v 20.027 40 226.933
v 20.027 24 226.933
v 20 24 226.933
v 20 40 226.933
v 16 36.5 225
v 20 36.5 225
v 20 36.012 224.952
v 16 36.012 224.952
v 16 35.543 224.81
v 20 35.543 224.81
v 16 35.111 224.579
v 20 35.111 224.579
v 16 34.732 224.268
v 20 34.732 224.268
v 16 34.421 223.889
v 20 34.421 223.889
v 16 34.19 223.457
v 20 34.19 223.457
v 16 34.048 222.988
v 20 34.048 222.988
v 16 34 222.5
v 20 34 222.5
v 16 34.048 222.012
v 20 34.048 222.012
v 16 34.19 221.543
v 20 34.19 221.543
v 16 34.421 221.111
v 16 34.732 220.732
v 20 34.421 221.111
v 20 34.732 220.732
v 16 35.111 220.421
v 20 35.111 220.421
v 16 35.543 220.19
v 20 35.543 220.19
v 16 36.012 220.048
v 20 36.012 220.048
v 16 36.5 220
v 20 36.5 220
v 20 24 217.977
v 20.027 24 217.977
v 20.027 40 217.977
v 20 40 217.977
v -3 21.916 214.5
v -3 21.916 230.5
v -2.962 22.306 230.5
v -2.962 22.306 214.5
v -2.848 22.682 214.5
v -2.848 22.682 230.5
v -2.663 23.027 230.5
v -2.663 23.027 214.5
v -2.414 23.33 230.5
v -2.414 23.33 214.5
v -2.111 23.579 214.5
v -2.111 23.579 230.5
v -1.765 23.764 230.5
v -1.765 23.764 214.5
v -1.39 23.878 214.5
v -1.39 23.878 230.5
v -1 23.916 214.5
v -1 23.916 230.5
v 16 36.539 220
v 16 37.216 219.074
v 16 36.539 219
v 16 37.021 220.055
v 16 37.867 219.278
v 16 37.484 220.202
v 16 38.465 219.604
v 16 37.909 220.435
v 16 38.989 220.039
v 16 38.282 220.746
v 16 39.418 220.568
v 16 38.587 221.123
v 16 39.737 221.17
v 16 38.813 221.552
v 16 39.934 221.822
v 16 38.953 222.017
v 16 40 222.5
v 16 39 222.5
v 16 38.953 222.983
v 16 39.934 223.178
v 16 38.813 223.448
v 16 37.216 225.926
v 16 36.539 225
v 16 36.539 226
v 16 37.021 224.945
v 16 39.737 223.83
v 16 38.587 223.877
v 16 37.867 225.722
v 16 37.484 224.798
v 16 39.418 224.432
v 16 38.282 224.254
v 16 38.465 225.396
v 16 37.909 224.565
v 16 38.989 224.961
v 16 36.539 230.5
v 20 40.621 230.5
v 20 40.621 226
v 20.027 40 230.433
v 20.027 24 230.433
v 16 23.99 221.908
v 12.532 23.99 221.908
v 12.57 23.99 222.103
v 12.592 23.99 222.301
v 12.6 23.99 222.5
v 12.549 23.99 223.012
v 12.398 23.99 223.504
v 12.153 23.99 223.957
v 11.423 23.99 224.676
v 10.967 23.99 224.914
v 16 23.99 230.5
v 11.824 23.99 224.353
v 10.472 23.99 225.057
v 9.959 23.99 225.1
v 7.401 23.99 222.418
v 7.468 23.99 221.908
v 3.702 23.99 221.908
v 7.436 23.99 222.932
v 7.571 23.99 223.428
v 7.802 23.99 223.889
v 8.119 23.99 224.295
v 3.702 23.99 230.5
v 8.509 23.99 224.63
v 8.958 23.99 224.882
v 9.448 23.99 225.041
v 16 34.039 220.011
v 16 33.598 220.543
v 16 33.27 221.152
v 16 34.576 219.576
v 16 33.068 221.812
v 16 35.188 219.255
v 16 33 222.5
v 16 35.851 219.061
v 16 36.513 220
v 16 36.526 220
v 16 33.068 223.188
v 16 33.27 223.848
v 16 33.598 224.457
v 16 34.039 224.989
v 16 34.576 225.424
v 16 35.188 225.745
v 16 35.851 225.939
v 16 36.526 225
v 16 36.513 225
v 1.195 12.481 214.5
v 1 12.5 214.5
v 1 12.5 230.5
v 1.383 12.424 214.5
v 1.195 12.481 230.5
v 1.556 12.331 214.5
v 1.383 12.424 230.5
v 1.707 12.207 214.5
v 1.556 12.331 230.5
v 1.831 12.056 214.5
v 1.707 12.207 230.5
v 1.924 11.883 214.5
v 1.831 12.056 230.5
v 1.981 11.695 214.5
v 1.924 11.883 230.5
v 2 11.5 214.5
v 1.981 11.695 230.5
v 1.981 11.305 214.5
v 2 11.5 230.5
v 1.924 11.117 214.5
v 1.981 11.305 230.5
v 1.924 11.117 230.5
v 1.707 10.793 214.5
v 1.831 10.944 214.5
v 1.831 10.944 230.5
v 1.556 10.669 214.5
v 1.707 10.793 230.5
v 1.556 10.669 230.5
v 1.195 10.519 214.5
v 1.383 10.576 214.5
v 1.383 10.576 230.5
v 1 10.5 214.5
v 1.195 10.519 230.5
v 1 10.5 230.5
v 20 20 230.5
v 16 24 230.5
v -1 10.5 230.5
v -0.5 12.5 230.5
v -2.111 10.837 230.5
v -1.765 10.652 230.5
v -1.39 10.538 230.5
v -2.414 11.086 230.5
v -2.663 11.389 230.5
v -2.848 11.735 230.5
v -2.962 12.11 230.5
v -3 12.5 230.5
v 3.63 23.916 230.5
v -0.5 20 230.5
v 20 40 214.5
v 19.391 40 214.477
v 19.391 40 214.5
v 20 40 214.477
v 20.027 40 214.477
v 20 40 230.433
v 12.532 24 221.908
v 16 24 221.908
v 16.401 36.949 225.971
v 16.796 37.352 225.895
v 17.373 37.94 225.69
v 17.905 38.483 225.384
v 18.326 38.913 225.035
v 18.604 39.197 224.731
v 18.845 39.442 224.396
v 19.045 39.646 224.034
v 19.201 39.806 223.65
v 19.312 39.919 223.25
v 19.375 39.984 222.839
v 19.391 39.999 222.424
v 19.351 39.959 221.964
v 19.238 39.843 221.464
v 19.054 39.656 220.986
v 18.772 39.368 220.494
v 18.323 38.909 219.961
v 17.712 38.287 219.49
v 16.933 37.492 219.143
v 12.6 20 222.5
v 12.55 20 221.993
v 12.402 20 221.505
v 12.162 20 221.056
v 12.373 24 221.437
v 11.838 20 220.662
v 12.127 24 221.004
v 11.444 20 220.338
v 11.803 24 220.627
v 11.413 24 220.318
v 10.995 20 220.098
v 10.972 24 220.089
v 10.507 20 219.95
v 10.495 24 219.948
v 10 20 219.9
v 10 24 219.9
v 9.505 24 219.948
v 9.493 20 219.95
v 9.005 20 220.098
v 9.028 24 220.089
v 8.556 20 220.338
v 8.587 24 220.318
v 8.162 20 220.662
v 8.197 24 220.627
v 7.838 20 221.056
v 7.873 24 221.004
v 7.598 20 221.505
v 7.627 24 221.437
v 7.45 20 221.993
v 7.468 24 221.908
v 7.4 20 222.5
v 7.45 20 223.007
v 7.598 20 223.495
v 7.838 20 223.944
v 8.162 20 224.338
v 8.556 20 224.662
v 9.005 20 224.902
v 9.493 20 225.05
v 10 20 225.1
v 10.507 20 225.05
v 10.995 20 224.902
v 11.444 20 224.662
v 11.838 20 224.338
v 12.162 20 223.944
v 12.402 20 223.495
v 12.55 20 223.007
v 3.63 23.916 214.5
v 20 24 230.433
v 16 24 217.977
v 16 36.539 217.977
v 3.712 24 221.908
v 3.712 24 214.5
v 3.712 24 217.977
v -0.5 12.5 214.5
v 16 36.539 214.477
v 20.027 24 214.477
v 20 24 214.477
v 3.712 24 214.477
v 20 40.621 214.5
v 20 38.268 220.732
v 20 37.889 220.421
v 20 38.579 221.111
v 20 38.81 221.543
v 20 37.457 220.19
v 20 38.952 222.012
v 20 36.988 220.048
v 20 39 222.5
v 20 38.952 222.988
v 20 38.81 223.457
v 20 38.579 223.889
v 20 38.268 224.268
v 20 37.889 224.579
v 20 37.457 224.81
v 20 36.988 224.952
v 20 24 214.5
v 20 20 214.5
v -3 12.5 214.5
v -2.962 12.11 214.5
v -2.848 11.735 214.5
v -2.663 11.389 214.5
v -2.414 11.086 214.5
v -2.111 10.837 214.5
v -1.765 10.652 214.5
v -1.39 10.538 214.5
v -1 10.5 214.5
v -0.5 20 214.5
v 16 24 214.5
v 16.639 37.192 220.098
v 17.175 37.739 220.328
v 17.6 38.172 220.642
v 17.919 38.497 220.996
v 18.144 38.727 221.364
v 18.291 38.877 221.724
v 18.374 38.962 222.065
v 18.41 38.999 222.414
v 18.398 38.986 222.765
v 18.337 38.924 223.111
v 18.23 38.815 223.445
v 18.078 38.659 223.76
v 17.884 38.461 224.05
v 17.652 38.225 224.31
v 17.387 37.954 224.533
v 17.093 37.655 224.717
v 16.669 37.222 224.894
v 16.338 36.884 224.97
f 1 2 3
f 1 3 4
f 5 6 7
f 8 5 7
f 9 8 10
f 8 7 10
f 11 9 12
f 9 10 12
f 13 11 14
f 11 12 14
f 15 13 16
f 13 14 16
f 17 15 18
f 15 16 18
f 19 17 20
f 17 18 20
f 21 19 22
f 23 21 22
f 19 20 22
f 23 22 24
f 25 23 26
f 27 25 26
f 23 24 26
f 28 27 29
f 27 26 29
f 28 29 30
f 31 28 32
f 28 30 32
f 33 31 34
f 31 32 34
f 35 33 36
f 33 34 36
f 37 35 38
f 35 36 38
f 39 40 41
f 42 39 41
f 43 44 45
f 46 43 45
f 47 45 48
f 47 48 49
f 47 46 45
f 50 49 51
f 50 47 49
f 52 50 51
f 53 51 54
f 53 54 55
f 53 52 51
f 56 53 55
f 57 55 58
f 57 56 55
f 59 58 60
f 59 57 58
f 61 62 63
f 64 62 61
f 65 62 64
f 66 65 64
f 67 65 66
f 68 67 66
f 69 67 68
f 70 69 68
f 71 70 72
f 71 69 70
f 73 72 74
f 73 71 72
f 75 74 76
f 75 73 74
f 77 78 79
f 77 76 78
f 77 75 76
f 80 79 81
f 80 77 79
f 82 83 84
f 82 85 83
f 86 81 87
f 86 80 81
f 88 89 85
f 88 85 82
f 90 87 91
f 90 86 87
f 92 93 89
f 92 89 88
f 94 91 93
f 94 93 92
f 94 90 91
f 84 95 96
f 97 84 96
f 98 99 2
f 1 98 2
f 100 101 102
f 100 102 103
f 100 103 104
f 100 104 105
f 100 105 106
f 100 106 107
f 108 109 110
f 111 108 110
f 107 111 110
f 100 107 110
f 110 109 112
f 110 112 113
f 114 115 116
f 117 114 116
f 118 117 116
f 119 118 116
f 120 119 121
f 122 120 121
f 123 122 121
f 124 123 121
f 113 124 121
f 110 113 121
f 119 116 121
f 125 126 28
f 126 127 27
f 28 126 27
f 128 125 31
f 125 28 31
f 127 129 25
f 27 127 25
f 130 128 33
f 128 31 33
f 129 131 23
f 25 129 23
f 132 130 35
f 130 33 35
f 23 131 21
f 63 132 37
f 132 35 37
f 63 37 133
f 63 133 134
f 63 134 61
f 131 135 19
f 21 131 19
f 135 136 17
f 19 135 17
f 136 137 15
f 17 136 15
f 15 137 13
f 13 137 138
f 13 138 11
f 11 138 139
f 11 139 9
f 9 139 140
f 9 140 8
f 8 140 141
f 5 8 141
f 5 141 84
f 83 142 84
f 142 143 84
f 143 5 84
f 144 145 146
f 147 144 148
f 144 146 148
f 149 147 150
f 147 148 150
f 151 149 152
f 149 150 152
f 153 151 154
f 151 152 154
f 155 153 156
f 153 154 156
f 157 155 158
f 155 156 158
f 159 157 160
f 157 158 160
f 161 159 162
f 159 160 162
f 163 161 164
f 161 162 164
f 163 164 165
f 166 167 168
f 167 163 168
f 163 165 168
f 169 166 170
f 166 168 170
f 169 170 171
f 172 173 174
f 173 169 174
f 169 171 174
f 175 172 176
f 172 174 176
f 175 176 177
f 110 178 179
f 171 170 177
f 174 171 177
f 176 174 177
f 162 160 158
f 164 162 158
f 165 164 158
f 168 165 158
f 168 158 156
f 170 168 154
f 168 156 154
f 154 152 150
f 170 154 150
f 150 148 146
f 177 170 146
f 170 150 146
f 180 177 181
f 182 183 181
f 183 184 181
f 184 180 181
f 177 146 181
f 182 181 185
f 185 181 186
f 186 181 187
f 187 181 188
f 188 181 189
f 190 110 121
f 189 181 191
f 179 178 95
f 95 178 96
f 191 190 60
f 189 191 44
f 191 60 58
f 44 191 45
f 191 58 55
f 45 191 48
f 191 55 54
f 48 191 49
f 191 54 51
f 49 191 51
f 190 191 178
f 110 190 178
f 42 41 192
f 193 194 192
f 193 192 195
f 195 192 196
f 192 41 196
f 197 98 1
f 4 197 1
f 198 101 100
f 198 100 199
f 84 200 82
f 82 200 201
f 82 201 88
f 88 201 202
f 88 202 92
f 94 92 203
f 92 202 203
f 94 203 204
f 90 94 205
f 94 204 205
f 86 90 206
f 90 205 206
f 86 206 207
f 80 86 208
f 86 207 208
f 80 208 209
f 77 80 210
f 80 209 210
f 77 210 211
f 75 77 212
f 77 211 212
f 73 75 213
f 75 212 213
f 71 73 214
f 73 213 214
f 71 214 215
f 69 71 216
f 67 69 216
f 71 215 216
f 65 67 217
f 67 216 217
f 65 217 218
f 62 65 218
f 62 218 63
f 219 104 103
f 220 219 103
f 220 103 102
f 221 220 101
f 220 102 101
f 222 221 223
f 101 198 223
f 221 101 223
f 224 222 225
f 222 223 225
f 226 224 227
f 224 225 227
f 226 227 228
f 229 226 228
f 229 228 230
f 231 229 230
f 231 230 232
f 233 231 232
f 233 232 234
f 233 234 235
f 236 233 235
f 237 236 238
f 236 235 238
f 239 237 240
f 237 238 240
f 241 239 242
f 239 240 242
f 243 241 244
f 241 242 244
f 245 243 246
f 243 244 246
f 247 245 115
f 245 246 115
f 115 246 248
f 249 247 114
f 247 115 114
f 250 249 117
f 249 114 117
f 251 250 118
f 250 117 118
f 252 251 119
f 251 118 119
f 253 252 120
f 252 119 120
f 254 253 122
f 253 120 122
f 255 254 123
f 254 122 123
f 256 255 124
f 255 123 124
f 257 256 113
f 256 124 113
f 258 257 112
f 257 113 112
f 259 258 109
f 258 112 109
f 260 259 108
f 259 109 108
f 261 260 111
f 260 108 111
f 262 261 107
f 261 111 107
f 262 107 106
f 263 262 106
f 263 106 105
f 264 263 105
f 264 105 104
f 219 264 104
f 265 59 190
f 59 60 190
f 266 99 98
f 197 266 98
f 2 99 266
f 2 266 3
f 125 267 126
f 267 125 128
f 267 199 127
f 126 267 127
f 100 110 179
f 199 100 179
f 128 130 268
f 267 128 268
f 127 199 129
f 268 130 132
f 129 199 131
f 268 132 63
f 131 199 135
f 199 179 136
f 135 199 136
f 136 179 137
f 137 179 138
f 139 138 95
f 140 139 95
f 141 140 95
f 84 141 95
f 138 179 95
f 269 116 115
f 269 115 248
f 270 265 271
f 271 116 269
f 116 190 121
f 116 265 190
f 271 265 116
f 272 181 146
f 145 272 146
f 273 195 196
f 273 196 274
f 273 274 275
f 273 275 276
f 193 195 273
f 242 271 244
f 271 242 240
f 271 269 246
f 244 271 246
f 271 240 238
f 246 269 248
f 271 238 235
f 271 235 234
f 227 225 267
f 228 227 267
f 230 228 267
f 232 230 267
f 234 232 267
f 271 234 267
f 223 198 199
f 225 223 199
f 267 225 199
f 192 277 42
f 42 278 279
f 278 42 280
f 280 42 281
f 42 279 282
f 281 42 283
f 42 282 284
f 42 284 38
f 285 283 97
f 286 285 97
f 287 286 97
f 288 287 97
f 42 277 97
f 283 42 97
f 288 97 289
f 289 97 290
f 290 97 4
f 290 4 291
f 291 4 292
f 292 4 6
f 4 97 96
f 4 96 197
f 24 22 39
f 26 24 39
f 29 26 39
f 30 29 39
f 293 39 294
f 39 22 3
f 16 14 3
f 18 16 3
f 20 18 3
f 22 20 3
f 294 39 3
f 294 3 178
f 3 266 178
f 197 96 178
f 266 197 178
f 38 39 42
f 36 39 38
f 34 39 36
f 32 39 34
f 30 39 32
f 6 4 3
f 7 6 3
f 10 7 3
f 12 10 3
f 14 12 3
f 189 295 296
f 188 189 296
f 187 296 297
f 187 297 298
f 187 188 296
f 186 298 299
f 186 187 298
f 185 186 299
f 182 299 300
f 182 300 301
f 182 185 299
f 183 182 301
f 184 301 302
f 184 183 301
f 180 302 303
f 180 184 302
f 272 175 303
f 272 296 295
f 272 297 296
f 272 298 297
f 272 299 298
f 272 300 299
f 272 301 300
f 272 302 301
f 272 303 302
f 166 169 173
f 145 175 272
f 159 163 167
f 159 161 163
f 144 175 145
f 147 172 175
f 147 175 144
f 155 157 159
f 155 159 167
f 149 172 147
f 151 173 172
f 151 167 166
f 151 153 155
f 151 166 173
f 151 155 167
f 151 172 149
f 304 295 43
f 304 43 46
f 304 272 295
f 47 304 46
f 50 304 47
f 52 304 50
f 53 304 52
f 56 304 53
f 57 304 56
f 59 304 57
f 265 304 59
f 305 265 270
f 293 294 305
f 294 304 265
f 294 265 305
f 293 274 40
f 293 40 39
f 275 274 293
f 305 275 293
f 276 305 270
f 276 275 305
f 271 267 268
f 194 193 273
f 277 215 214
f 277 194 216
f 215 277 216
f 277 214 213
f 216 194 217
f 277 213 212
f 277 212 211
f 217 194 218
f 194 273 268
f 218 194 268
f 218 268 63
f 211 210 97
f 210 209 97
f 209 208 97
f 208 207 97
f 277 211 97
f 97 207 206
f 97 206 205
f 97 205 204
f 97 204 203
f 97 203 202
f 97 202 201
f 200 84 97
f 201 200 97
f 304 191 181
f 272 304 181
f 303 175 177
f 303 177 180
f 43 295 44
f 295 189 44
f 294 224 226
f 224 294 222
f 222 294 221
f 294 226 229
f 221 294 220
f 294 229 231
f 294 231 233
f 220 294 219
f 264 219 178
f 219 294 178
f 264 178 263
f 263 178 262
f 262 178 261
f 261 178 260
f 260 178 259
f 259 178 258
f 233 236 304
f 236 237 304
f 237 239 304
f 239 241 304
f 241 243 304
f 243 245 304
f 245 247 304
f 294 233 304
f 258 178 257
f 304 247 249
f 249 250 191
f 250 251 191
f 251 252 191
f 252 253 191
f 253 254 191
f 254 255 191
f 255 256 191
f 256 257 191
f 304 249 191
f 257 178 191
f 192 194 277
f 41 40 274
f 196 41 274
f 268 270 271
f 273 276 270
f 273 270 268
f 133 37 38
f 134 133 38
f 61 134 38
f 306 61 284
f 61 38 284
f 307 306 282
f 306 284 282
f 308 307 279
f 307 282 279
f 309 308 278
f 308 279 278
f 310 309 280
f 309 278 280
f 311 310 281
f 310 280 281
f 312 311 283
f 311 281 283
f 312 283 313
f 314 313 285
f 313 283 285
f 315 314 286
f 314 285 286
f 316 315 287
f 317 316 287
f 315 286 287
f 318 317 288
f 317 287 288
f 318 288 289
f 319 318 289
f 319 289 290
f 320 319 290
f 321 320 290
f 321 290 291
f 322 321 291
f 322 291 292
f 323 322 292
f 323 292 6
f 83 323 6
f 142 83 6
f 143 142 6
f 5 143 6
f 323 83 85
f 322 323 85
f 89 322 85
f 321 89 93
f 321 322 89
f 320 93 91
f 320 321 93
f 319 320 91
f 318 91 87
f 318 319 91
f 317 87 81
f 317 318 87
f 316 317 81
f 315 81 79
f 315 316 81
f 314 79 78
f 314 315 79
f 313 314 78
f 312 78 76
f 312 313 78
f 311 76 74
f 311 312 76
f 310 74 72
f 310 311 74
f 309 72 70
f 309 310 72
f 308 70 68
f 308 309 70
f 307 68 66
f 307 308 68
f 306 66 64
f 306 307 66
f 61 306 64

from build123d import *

# Parameters (mm, degrees)
SKETCH1_W                      = 30.121125575
SKETCH1_H                      = 11.523232915
BOSS_EXTRUDE1_DEPTH            = 4
SKETCH2_W                      = 0.023452759
SKETCH2_H                      = 13.5
CUT_EXTRUDE1_DEPTH             = 4
SKETCH3_W                      = 11.499780156
SKETCH3_H                      = 13.5
BOSS_EXTRUDE2_DEPTH            = 19
CUT_EXTRUDE2_DEPTH             = 47.721095233
DRAFT1_ANGLE                   = -45.58058215
SKETCH5_W                      = 11.499780156
SKETCH5_H                      = 0.083772182
CUT_EXTRUDE3_DEPTH             = 6.630261323
SKETCH6_W                      = 20.5
SKETCH6_H                      = 11.499780156
CUT_EXTRUDE4_DEPTH             = 7.5
BOSS_EXTRUDE3_START            = 4.500219844
BOSS_EXTRUDE3_DEPTH            = 4.500219844
SKETCH8_W                      = 8.592269897
SKETCH8_H                      = 0.01006031
CUT_EXTRUDE5_DEPTH             = 12.369738677
DRAFT2_ANGLE                   = 44.41941785
FILLET1_R                      = 2
CUT_EXTRUDE6_REACH             = 50.022
SKETCH10_W                     = 3.5
SKETCH10_H                     = 16
BOSS_EXTRUDE4_DEPTH            = 0.02681
SKETCH11_W                     = 3.5
SKETCH11_H                     = 16
BOSS_EXTRUDE5_DEPTH            = 0.02681
BOSS_EXTRUDE6_DEPTH            = 3.5
F_5_2_5_2_DIAMETER_HOLE1_D     = 5.2
F_5_2_5_2_DIAMETER_HOLE1_DEPTH = 20.621150575
F_5_0_5_DIAMETER_HOLE1_D       = 5
F_5_0_5_DIAMETER_HOLE1_DEPTH   = 4.026810169
BOSS_EXTRUDE7_START            = -4
SKETCH17_R                     = 3.5
SKETCH17_R_2                   = 2.5
BOSS_EXTRUDE7_DEPTH            = 4


with BuildPart() as part:
    # Sketch1 → Boss-Extrude1 (new body)
    with BuildSketch(Plane(origin=(16, 0, 0), x_dir=(0, -1, 0), z_dir=(-1, 0, 0))):
        with Locations((-25.560562788, 220.238163699)):
            Rectangle(SKETCH1_W, SKETCH1_H)
    extrude(amount=-BOSS_EXTRUDE1_DEPTH)

    # Sketch2 → Cut-Extrude1 (cut)
    with BuildSketch(Plane(origin=(20, 0, 0), x_dir=(0, 0, -1), z_dir=(1, 0, 0))):
        with Locations((-214.488273621, 17.25)):
            Rectangle(SKETCH2_W, SKETCH2_H)
    extrude(amount=-CUT_EXTRUDE1_DEPTH, mode=Mode.SUBTRACT)

    # Sketch3 → Boss-Extrude2 (add)
    with BuildSketch(Plane.ZY.offset(-16)):
        with Locations((220.249890078, 17.25)):
            Rectangle(SKETCH3_W, SKETCH3_H)
    extrude(amount=BOSS_EXTRUDE2_DEPTH)

    # Sketch4 → Cut-Extrude2 (cut, through all)
    with BuildSketch(Plane.XY.offset(225.999780156)):
        with BuildLine():
            Line((1, 10.5), (20, 10.5))
            Line((20, 10.5), (20, 12.5))
            Line((20, 12.5), (1, 12.5))
            ThreePointArc((1, 12.5), (2, 11.5), (1, 10.5))
        make_face()
    extrude(amount=-CUT_EXTRUDE2_DEPTH, mode=Mode.SUBTRACT)

    # Draft1
    draft1_faces = [part.faces().sort_by_distance(p)[0] for p in [
        (18, 40.621125575, 220.238163698),
    ]]
    draft(draft1_faces, Plane(origin=(20, 0, 0), x_dir=(0, 0, 1), z_dir=(1, 0, 0)), DRAFT1_ANGLE)

    # Sketch5 → Cut-Extrude3 (cut)
    with BuildSketch(Plane.ZY.offset(3)):
        with Locations((220.249890078, 23.958113909)):
            Rectangle(SKETCH5_W, SKETCH5_H)
    extrude(amount=-CUT_EXTRUDE3_DEPTH, mode=Mode.SUBTRACT)

    # Sketch6 → Cut-Extrude4 (cut)
    with BuildSketch(Plane.XZ.offset(-12.5)):
        with Locations((9.75, 220.249890078)):
            Rectangle(SKETCH6_W, SKETCH6_H)
    extrude(amount=-CUT_EXTRUDE4_DEPTH, mode=Mode.SUBTRACT)

    # Sketch7 → Boss-Extrude3 (add)
    with BuildSketch(Plane.XY.offset(225.999780156).offset(BOSS_EXTRUDE3_START)):
        with BuildLine():
            Line((-3, 10.5), (-3, 23.916227818))
            Line((-3, 23.916227818), (3.630261323, 23.916227818))
            Line((3.630261323, 23.916227818), (3.630261323, 24))
            Line((3.630261323, 24), (16, 24))
            Line((16, 24), (16, 36.539228341))
            Line((16, 36.539228341), (20, 40.621125575))
            Line((20, 40.621125575), (20, 20))
            Line((20, 20), (-0.5, 20))
            Line((-0.5, 20), (-0.5, 12.5))
            Line((-0.5, 12.5), (1, 12.5))
            ThreePointArc((1, 12.5), (2, 11.5), (1, 10.5))
            Line((1, 10.5), (-3, 10.5))
        make_face()
    extrude(amount=-BOSS_EXTRUDE3_DEPTH)

    # Sketch8 → Cut-Extrude5 (cut)
    with BuildSketch(Plane.ZY.offset(-3.630261323)):
        with Locations((226.203865052, 23.994969845)):
            Rectangle(SKETCH8_W, SKETCH8_H)
    extrude(amount=-CUT_EXTRUDE5_DEPTH, mode=Mode.SUBTRACT)

    # Draft2
    draft2_faces = [part.faces().sort_by_distance(p)[0] for p in [
        (3.630261323, 23.955573176, 222.244667153),
    ]]
    draft(draft2_faces, Plane(origin=(3.630261323, 23.916227818, 214.5), x_dir=(0, 0, 1), z_dir=(0, 1, 0)), DRAFT2_ANGLE)

    # Fillet1
    fillet1_edges = [part.edges().sort_by_distance(p)[0] for p in [
        (-3, 10.5, 222.5),
        (-3, 23.916227818, 222.5),
    ]]
    fillet(fillet1_edges, radius=FILLET1_R)

    # Sketch9 → Cut-Extrude6 (cut, up to next)
    with BuildSketch(Plane.XY.offset(214.5), mode=Mode.PRIVATE) as cut_extrude6_sk1:
        Polygon((20, 40), (20, 40.621125575), (19.391336391, 40), align=None)
    cut_extrude6_tool1 = extrude(cut_extrude6_sk1.sketch, amount=-CUT_EXTRUDE6_REACH, mode=Mode.PRIVATE) & part.part
    add(cut_extrude6_tool1.solids().sort_by_distance((19.797112, 40.207042, 214.5))[0], mode=Mode.SUBTRACT)

    # Sketch10 → Boss-Extrude4 (add)
    with BuildSketch(Plane(origin=(20.026810169, 0, 0), x_dir=(0, 0, -1), z_dir=(1, 0, 0))):
        with Locations((-216.226547241, 32)):
            Rectangle(SKETCH10_W, SKETCH10_H)
    extrude(amount=-BOSS_EXTRUDE4_DEPTH)

    # Sketch11 → Boss-Extrude5 (add)
    with BuildSketch(Plane(origin=(20.026810169, 0, 0), x_dir=(0, 0, -1), z_dir=(1, 0, 0))):
        with Locations((-228.683158875, 32)):
            Rectangle(SKETCH11_W, SKETCH11_H)
    extrude(amount=-BOSS_EXTRUDE5_DEPTH)

    # Sketch12 → Boss-Extrude6 (add)
    with BuildSketch(Plane(origin=(0, 0, 214.476547241), x_dir=(-1, 0, 0), z_dir=(0, 0, -1))):
        Polygon((-16, 24), (-3.71235274, 24), (-16, 36.539228341), align=None)
    extrude(amount=-BOSS_EXTRUDE6_DEPTH)

    # Ø5.2 (5.2) Diameter Hole1
    with Locations(Plane(origin=(0, 20, 0), x_dir=(-1, 0, 0), z_dir=(0, -1, 0))):
        with Locations((-10, -222.5)):
            Hole(F_5_2_5_2_DIAMETER_HOLE1_D / 2, depth=F_5_2_5_2_DIAMETER_HOLE1_DEPTH)

    # Ø5.0 (5) Diameter Hole1
    with Locations(Plane.ZY.offset(-16)):
        with Locations((222.5, 36.5)):
            Hole(F_5_0_5_DIAMETER_HOLE1_D / 2, depth=F_5_0_5_DIAMETER_HOLE1_DEPTH)

    # Sketch17 → Boss-Extrude7 (add)
    with BuildSketch(Plane.ZY.offset(-16).offset(BOSS_EXTRUDE7_START)):
        with Locations((222.5, 36.5)):
            Circle(SKETCH17_R)
        with Locations((222.5, 36.5)):
            Circle(SKETCH17_R_2, mode=Mode.SUBTRACT)
    extrude(amount=BOSS_EXTRUDE7_DEPTH)


solid = part.part
